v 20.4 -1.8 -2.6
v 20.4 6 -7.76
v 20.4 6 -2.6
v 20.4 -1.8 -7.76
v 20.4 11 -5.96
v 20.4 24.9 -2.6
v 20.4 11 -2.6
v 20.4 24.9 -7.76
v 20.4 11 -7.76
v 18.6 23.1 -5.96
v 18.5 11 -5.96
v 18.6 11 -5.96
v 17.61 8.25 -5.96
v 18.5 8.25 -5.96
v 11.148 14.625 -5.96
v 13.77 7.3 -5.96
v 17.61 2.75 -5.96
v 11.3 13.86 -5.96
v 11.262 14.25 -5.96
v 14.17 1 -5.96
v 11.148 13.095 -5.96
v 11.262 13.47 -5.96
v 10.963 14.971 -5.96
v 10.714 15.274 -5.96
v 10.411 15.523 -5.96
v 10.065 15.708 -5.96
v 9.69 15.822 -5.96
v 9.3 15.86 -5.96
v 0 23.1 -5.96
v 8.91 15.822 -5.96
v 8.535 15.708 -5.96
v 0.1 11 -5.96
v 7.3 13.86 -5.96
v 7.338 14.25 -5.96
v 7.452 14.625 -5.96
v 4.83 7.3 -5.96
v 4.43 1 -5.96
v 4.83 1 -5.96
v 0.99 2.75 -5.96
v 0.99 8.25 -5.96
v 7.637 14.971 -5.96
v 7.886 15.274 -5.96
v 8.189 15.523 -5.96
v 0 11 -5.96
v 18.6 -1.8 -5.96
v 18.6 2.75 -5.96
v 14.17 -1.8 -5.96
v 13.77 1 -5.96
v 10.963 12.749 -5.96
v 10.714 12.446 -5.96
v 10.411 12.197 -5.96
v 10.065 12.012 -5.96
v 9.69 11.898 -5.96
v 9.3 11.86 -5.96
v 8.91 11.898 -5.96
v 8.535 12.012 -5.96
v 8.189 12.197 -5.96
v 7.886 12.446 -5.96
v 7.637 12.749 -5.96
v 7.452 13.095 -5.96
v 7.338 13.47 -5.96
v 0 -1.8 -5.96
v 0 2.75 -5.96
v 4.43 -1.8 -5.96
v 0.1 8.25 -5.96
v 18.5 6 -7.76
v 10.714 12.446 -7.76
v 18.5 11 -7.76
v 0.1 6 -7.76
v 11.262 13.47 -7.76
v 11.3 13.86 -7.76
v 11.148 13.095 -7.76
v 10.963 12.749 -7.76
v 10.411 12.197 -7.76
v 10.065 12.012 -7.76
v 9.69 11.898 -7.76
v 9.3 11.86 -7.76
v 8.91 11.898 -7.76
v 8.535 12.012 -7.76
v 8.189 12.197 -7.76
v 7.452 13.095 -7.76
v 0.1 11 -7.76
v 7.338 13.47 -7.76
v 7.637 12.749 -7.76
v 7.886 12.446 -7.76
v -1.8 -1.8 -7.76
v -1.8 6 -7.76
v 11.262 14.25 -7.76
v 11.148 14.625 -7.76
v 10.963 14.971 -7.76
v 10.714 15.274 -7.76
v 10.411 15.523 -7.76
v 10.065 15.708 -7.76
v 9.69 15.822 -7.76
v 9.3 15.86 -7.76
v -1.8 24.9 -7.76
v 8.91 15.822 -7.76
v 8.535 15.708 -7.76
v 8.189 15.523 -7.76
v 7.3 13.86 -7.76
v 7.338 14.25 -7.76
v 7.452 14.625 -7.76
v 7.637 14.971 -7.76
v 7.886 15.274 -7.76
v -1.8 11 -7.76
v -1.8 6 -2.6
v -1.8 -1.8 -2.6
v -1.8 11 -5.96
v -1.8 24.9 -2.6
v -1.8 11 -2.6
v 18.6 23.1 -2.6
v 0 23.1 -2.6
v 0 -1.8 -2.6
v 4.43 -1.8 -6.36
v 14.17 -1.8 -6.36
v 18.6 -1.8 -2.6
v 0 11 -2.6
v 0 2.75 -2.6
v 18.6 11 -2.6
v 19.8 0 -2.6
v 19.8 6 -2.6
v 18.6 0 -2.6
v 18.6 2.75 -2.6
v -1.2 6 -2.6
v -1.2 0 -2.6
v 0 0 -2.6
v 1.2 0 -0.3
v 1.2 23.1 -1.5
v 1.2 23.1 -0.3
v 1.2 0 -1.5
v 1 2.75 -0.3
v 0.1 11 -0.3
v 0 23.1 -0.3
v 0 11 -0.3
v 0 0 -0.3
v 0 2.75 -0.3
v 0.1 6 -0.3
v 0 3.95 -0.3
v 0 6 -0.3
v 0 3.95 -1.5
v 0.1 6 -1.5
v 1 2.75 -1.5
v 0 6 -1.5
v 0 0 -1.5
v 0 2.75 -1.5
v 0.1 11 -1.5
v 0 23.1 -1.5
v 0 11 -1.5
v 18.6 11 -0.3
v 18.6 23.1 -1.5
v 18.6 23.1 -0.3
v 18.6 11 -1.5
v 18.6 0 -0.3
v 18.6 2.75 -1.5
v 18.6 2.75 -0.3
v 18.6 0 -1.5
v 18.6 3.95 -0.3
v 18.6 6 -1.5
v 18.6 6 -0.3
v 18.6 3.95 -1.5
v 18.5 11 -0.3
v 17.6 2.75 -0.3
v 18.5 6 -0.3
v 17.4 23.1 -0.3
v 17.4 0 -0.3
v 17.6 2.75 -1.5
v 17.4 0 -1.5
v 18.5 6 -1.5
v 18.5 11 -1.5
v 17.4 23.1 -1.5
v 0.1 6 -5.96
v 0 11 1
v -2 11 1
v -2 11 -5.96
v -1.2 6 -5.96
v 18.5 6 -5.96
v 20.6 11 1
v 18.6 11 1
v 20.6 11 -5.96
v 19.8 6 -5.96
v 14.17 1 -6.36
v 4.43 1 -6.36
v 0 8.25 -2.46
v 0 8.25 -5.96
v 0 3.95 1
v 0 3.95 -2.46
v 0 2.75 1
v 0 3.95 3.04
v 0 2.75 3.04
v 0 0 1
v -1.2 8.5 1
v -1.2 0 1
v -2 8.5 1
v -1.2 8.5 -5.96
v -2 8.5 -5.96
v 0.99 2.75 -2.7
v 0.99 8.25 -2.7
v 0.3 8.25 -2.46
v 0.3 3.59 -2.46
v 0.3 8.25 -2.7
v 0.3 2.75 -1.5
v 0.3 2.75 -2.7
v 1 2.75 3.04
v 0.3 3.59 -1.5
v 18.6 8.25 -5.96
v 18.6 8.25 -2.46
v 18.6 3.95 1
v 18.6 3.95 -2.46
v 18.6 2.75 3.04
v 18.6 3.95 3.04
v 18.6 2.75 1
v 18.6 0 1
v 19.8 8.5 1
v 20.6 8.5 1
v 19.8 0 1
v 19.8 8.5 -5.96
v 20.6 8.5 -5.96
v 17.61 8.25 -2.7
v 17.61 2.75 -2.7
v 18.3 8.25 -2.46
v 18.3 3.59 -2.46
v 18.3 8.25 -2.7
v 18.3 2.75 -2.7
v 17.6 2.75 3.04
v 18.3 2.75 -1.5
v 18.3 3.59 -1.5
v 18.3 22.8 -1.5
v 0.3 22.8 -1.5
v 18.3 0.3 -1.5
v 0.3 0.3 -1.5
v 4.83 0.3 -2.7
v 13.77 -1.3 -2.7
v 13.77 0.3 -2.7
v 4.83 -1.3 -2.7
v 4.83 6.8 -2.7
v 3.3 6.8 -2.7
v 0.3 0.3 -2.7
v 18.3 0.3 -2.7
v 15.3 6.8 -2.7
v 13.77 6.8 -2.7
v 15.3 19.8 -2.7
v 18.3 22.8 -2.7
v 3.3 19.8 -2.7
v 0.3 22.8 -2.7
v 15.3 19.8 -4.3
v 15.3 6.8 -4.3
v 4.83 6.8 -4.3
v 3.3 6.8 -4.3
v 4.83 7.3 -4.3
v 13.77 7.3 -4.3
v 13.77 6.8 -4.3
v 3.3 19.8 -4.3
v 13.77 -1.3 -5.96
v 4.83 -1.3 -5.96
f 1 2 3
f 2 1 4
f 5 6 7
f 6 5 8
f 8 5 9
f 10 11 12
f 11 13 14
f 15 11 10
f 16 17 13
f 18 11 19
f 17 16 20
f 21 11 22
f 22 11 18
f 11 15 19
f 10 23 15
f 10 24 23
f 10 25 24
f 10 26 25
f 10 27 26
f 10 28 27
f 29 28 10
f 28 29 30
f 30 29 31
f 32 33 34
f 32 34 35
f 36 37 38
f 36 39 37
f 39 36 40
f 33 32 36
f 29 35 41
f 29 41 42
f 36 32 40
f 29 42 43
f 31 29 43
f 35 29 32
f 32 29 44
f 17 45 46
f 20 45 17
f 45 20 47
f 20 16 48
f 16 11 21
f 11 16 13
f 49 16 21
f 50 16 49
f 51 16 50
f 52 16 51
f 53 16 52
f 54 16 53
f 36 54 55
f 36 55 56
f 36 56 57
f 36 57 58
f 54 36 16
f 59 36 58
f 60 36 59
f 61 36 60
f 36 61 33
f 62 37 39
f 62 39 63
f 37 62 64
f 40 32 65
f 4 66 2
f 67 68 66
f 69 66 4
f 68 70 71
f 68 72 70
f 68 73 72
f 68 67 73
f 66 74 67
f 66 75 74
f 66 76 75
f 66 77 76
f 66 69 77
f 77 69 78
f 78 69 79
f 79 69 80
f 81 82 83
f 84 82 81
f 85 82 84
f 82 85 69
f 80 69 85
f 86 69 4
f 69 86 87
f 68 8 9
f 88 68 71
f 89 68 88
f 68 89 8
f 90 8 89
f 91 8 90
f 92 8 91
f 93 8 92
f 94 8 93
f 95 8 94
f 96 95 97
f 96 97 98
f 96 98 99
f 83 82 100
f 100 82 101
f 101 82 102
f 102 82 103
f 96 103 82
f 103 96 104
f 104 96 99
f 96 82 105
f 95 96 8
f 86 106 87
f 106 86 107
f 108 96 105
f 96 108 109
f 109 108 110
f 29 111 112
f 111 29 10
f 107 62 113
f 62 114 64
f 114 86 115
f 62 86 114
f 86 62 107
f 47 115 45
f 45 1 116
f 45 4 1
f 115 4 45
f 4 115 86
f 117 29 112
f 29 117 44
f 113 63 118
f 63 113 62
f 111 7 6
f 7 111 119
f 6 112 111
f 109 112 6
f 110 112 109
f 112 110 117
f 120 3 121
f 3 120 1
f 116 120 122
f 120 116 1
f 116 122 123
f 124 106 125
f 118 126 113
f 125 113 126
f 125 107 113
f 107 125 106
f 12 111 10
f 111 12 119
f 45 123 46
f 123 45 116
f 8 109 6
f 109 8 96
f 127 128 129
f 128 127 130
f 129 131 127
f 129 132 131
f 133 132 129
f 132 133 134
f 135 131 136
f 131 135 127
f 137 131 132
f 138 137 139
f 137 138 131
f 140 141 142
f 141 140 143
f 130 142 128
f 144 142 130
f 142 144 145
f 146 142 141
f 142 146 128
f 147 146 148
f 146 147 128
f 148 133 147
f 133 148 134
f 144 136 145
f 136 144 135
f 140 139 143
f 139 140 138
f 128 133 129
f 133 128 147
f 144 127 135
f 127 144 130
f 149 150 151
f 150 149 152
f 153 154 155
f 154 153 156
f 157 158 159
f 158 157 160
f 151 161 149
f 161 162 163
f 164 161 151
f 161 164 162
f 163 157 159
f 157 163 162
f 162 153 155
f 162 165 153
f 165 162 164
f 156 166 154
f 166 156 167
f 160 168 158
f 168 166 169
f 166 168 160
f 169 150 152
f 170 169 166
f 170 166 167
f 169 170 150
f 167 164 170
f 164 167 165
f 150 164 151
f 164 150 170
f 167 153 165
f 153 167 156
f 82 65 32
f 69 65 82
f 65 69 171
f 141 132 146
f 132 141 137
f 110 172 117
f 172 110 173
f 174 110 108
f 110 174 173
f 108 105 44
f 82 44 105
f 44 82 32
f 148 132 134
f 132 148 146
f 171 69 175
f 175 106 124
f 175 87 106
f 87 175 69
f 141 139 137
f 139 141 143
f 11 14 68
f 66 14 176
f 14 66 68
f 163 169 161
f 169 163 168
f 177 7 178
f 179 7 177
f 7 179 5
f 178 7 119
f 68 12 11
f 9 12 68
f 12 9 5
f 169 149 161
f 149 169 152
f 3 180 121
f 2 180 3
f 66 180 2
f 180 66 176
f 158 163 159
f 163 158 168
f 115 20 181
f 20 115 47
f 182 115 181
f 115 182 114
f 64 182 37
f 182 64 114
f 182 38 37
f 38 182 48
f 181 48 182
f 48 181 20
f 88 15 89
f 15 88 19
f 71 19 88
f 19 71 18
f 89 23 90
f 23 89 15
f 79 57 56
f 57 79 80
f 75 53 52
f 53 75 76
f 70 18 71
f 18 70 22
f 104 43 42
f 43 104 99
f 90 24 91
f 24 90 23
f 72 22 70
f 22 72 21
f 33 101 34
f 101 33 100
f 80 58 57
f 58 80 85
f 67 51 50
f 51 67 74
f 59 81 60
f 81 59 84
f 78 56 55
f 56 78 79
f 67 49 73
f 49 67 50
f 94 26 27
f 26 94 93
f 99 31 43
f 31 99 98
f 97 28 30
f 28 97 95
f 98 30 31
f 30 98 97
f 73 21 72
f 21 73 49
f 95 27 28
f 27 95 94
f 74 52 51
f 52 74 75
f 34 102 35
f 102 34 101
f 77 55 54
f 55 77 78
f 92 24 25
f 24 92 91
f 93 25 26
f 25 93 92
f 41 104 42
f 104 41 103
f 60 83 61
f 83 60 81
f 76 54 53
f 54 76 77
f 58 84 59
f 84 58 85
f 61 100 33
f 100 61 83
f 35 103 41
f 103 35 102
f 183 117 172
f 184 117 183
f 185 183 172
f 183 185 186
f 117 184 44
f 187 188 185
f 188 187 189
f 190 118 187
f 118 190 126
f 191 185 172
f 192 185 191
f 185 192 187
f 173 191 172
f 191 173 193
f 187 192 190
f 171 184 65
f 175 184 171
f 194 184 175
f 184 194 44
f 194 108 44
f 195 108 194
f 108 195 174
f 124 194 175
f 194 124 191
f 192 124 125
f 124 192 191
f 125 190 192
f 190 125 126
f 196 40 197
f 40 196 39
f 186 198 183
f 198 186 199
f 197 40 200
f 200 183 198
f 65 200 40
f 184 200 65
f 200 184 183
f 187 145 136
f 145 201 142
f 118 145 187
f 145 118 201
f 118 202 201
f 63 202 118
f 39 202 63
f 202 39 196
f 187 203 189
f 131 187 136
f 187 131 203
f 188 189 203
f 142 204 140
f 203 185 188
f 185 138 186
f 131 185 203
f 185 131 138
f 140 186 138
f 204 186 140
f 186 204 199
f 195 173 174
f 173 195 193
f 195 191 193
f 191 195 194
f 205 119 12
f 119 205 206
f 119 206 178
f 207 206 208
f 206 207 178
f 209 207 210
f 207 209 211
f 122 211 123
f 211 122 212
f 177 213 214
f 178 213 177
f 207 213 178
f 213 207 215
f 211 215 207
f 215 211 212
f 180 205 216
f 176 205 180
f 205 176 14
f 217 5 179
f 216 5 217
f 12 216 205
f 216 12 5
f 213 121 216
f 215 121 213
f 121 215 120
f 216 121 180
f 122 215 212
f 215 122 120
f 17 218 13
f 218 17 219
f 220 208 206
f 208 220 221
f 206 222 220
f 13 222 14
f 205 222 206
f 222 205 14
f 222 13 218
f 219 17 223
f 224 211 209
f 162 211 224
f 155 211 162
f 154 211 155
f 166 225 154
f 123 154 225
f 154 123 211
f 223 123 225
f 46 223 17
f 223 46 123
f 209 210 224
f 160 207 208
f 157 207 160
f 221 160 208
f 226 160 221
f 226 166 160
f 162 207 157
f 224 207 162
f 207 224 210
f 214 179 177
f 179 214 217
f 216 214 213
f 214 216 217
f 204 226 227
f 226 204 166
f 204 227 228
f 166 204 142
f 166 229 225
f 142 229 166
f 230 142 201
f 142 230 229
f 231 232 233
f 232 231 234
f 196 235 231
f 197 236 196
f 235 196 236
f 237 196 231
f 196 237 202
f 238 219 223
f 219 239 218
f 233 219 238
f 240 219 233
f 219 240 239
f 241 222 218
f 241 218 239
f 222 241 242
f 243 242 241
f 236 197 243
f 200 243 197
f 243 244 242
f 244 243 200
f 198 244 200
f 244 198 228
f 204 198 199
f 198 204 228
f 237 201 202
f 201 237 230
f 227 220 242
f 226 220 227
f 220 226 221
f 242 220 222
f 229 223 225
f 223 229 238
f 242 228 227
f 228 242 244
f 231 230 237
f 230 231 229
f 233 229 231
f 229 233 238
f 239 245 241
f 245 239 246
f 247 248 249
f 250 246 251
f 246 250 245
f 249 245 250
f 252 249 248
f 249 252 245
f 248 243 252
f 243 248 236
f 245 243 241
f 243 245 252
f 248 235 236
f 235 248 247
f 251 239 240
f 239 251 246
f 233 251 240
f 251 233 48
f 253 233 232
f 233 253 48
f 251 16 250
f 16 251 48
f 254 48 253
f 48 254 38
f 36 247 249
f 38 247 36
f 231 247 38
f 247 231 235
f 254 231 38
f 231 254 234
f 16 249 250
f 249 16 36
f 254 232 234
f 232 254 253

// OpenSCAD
// =============================================================================
// mini7seg_esp_cradle_v2.scad
//
// ESP32-C3 Super Mini cradle, far right of the enclosure, USB-C pointing DOWN
// so a wall-mounted case lets the cable hang straight. No rivets anywhere.
//
// WHY THE CLIPS FLEX SIDEWAYS AND NOT BACKWARDS
//   The case prints window-face-down, so every layer line lies in XY. A clip
//   that flexes in Z is being asked to pull its own layers apart — the single
//   weakest direction in FDM, and PETG's layer bond is where it breaks. A clip
//   that flexes in X or Y bends ALONG the layers instead, which is solid
//   material doing what it is good at.
//   So: the board pushes in toward the window (+Z) past two side clips that
//   deflect outward in X, and they snap over its back face.
//
// CLIP SIZING, not guessed
//   Cantilever surface strain  e = 3*t*d / (2*L^2)
//     t 1.2 mm thick, d 1.0 mm deflection, L 11 mm long
//     e = 3(1.2)(1.0) / (2*121) = 1.5%
//   PETG yields around 4-5%, so 1.5% is a clip that can be worked repeatedly
//   rather than one that survives two insertions. A short stiff clip is what
//   snaps: at L = 6 the same deflection gives 5% and it breaks.
//
// EASY OUT
//   One finger notch either side of each clip so a fingernail reaches the pad,
//   and a push-through hole under the board so a probe can pop it from the
//   front if it ever seizes.
//
// DEPTH
//   Minimum practical stack behind the panel:
//     panel back            0.0   (local datum)
//     solder clearance      1.5   H1/H2 joints stand proud; this is NOT air
//     esp pcb               1.2
//     usb shell / can       3.3
//                          ----
//                           6.0   total cavity
//
// ⚠ CHECK-marked values are from photographs, not calipers.
// =============================================================================

// ---------- ESP32-C3 Super Mini ----------
esp_w       = 18.0;    // CHECK  across the castellated rows  (horizontal here)
esp_l       = 22.5;    // CHECK  along the USB axis           (vertical here)
esp_t       = 1.2;     // CHECK  pcb only
usb_w       = 8.94;    // CHECK  receptacle shell
usb_t       = 3.26;    // CHECK
usb_proud   = 1.6;     // oversail past the board edge
mod_t       = 1.6;
btn_t       = 1.7;

// ---------- stack ----------
solder_gap  = 1.5;     // panel-back solder fillets, the real floor of the cavity
fit         = 0.3;     // per side, board to pocket

// ---------- clips ----------
clip_l      = 11.0;    // long enough to keep strain at 1.5%
clip_t      = 1.2;
clip_grab   = 1.0;     // how far it overlaps the board's back face
clip_ramp   = 1.2;     // lead-in so it pushes in with a thumb
notch_w     = 5.0;     // fingernail access beside each clip

wall        = 1.8;
rail        = 1.2;     // ledge the board's front face rests on

// ---------- derived (local frame: z=0 is the PANEL BACK, -z goes rearward) ----
z_esp_front = -solder_gap;
z_esp_back  = z_esp_front - esp_t;
z_parts     = z_esp_back - max(usb_t, mod_t, btn_t);
pocket_w    = esp_w + 2 * fit;
pocket_l    = esp_l + 2 * fit;

mode = "fitted";   // fitted | cradle | section | released | esp

// =============================================================================
module esp32_c3() {
    color([0.10, 0.10, 0.12]) cube([esp_w, esp_l, esp_t]);
    color([0.85, 0.70, 0.30])
        for (s = [0, 1], i = [0 : 7])
            translate([s ? esp_w - 0.9 : 0, 2.2 + i * 2.54, 0]) cube([0.9, 1.6, esp_t]);
    color([0.55, 0.55, 0.58])
        translate([(esp_w - 12) / 2, esp_l - 16, -1.6]) cube([12, 13, 1.6]);
    // USB-C at the BOTTOM edge, shell on the component side, oversailing -Y
    color([0.75, 0.75, 0.78])
        translate([(esp_w - usb_w) / 2, -usb_proud, -usb_t]) cube([usb_w, 7 + usb_proud, usb_t]);
}

// A single side clip. Root at the back, finger pad at the open end.
module clip(mirrored = false, clip_t = clip_t, clip_grab = clip_grab, clip_l = clip_l) {
    mirror([mirrored ? 1 : 0, 0, 0])
    translate([-clip_t, 0, 0]) {
        // the flexing beam, lying in the XY plane so it bends along layers
        cube([clip_t, clip_l, abs(z_parts) + 1]);
        // the grab: overlaps the board's back face
        translate([clip_t - 0.01, clip_l * 0.25, 0])
            cube([clip_grab, clip_l * 0.5, abs(z_esp_back) + 0.8]);
        // lead-in ramp, so pushing the board in spreads the clip
        translate([clip_t, clip_l * 0.25, abs(z_esp_back) + 0.8])
            rotate([0, 0, 0])
                linear_extrude(clip_l * 0.5)
                    polygon([[0, 0], [clip_grab, 0], [0, clip_ramp]]);
        // finger pad
        translate([-0.8, clip_l - 2.5, 0]) cube([0.8, 2.5, abs(z_parts) + 1]);
    }
}

module cradle(clip_t = clip_t, clip_grab = clip_grab, fit = fit) {
    pocket_w = esp_w + 2 * fit;
    pocket_l = esp_l + 2 * fit;
    difference() {
        union() {
            // back plate the ESP sits against + side walls
            translate([-wall, -wall, z_parts - wall])
                cube([pocket_w + 2 * wall, pocket_l + wall, wall]);
            translate([-wall, -wall, z_parts - wall])
                cube([wall, pocket_l + wall, abs(z_parts) + 1 - wall]);
            translate([pocket_w, -wall, z_parts - wall])
                cube([wall, pocket_l + wall, abs(z_parts) + 1 - wall]);
            // hard stop at the TOP — plugging a cable in drives the board up,
            // and this is what takes it, not the clips.
            translate([-wall, pocket_l, z_parts - wall])
                cube([pocket_w + 2 * wall, wall, abs(z_parts) + 1 - wall]);
            // front rails the board's face lands on
            translate([0, 0, z_esp_front])
                cube([rail, pocket_l, rail]);
            translate([pocket_w - rail, 0, z_esp_front])
                cube([rail, pocket_l, rail]);
        }
        // USB slot: open toward the REAR so the board lifts straight out once
        // the clips are released. A closed hole would trap it.
        translate([(pocket_w - usb_w) / 2 - 0.4, -wall - 1, z_esp_back - usb_t - 0.4])
            cube([usb_w + 0.8, wall + 2, usb_t + 0.8 + 6]);
        // fingernail notches beside each clip
        for (x = [-wall - 0.1, pocket_w - 0.1])
            translate([x, clip_l - notch_w, z_parts - wall - 0.1])
                cube([wall + 0.2, notch_w, abs(z_parts) + 2]);
        // push-through hole: pop the board from the front with a probe
        translate([pocket_w / 2, pocket_l * 0.6, z_parts - wall - 1])
            cylinder(d = 4, h = wall + 2, $fn = 32);
    }
    // the two clips
    translate([0, 0, z_parts]) clip(false, clip_t, clip_grab, clip_l);
    translate([pocket_w, 0, z_parts]) clip(true, clip_t, clip_grab, clip_l);
}

module fitted() { cradle(); translate([fit, fit, z_esp_back]) esp32_c3(); }

if (mode == "esp") esp32_c3();
else if (mode == "cradle") cradle();
else if (mode == "released") { cradle(); translate([fit, fit, z_esp_back + 9]) esp32_c3(); }
else if (mode == "section")
    difference() { fitted(); translate([pocket_w / 2, -30, -40]) cube([60, 90, 80]); }
else fitted();

echo(str("cavity behind panel: ", -z_parts, " mm   (solder ", solder_gap, " + pcb ", esp_t, " + parts ", max(usb_t, mod_t, btn_t), ")"));
echo(str("cradle envelope: ", pocket_w + 2 * wall, " x ", pocket_l + wall, " mm"));
echo(str("clip strain at ", clip_grab, " mm deflection: ", 100 * 3 * clip_t * clip_grab / (2 * clip_l * clip_l), " %"));
